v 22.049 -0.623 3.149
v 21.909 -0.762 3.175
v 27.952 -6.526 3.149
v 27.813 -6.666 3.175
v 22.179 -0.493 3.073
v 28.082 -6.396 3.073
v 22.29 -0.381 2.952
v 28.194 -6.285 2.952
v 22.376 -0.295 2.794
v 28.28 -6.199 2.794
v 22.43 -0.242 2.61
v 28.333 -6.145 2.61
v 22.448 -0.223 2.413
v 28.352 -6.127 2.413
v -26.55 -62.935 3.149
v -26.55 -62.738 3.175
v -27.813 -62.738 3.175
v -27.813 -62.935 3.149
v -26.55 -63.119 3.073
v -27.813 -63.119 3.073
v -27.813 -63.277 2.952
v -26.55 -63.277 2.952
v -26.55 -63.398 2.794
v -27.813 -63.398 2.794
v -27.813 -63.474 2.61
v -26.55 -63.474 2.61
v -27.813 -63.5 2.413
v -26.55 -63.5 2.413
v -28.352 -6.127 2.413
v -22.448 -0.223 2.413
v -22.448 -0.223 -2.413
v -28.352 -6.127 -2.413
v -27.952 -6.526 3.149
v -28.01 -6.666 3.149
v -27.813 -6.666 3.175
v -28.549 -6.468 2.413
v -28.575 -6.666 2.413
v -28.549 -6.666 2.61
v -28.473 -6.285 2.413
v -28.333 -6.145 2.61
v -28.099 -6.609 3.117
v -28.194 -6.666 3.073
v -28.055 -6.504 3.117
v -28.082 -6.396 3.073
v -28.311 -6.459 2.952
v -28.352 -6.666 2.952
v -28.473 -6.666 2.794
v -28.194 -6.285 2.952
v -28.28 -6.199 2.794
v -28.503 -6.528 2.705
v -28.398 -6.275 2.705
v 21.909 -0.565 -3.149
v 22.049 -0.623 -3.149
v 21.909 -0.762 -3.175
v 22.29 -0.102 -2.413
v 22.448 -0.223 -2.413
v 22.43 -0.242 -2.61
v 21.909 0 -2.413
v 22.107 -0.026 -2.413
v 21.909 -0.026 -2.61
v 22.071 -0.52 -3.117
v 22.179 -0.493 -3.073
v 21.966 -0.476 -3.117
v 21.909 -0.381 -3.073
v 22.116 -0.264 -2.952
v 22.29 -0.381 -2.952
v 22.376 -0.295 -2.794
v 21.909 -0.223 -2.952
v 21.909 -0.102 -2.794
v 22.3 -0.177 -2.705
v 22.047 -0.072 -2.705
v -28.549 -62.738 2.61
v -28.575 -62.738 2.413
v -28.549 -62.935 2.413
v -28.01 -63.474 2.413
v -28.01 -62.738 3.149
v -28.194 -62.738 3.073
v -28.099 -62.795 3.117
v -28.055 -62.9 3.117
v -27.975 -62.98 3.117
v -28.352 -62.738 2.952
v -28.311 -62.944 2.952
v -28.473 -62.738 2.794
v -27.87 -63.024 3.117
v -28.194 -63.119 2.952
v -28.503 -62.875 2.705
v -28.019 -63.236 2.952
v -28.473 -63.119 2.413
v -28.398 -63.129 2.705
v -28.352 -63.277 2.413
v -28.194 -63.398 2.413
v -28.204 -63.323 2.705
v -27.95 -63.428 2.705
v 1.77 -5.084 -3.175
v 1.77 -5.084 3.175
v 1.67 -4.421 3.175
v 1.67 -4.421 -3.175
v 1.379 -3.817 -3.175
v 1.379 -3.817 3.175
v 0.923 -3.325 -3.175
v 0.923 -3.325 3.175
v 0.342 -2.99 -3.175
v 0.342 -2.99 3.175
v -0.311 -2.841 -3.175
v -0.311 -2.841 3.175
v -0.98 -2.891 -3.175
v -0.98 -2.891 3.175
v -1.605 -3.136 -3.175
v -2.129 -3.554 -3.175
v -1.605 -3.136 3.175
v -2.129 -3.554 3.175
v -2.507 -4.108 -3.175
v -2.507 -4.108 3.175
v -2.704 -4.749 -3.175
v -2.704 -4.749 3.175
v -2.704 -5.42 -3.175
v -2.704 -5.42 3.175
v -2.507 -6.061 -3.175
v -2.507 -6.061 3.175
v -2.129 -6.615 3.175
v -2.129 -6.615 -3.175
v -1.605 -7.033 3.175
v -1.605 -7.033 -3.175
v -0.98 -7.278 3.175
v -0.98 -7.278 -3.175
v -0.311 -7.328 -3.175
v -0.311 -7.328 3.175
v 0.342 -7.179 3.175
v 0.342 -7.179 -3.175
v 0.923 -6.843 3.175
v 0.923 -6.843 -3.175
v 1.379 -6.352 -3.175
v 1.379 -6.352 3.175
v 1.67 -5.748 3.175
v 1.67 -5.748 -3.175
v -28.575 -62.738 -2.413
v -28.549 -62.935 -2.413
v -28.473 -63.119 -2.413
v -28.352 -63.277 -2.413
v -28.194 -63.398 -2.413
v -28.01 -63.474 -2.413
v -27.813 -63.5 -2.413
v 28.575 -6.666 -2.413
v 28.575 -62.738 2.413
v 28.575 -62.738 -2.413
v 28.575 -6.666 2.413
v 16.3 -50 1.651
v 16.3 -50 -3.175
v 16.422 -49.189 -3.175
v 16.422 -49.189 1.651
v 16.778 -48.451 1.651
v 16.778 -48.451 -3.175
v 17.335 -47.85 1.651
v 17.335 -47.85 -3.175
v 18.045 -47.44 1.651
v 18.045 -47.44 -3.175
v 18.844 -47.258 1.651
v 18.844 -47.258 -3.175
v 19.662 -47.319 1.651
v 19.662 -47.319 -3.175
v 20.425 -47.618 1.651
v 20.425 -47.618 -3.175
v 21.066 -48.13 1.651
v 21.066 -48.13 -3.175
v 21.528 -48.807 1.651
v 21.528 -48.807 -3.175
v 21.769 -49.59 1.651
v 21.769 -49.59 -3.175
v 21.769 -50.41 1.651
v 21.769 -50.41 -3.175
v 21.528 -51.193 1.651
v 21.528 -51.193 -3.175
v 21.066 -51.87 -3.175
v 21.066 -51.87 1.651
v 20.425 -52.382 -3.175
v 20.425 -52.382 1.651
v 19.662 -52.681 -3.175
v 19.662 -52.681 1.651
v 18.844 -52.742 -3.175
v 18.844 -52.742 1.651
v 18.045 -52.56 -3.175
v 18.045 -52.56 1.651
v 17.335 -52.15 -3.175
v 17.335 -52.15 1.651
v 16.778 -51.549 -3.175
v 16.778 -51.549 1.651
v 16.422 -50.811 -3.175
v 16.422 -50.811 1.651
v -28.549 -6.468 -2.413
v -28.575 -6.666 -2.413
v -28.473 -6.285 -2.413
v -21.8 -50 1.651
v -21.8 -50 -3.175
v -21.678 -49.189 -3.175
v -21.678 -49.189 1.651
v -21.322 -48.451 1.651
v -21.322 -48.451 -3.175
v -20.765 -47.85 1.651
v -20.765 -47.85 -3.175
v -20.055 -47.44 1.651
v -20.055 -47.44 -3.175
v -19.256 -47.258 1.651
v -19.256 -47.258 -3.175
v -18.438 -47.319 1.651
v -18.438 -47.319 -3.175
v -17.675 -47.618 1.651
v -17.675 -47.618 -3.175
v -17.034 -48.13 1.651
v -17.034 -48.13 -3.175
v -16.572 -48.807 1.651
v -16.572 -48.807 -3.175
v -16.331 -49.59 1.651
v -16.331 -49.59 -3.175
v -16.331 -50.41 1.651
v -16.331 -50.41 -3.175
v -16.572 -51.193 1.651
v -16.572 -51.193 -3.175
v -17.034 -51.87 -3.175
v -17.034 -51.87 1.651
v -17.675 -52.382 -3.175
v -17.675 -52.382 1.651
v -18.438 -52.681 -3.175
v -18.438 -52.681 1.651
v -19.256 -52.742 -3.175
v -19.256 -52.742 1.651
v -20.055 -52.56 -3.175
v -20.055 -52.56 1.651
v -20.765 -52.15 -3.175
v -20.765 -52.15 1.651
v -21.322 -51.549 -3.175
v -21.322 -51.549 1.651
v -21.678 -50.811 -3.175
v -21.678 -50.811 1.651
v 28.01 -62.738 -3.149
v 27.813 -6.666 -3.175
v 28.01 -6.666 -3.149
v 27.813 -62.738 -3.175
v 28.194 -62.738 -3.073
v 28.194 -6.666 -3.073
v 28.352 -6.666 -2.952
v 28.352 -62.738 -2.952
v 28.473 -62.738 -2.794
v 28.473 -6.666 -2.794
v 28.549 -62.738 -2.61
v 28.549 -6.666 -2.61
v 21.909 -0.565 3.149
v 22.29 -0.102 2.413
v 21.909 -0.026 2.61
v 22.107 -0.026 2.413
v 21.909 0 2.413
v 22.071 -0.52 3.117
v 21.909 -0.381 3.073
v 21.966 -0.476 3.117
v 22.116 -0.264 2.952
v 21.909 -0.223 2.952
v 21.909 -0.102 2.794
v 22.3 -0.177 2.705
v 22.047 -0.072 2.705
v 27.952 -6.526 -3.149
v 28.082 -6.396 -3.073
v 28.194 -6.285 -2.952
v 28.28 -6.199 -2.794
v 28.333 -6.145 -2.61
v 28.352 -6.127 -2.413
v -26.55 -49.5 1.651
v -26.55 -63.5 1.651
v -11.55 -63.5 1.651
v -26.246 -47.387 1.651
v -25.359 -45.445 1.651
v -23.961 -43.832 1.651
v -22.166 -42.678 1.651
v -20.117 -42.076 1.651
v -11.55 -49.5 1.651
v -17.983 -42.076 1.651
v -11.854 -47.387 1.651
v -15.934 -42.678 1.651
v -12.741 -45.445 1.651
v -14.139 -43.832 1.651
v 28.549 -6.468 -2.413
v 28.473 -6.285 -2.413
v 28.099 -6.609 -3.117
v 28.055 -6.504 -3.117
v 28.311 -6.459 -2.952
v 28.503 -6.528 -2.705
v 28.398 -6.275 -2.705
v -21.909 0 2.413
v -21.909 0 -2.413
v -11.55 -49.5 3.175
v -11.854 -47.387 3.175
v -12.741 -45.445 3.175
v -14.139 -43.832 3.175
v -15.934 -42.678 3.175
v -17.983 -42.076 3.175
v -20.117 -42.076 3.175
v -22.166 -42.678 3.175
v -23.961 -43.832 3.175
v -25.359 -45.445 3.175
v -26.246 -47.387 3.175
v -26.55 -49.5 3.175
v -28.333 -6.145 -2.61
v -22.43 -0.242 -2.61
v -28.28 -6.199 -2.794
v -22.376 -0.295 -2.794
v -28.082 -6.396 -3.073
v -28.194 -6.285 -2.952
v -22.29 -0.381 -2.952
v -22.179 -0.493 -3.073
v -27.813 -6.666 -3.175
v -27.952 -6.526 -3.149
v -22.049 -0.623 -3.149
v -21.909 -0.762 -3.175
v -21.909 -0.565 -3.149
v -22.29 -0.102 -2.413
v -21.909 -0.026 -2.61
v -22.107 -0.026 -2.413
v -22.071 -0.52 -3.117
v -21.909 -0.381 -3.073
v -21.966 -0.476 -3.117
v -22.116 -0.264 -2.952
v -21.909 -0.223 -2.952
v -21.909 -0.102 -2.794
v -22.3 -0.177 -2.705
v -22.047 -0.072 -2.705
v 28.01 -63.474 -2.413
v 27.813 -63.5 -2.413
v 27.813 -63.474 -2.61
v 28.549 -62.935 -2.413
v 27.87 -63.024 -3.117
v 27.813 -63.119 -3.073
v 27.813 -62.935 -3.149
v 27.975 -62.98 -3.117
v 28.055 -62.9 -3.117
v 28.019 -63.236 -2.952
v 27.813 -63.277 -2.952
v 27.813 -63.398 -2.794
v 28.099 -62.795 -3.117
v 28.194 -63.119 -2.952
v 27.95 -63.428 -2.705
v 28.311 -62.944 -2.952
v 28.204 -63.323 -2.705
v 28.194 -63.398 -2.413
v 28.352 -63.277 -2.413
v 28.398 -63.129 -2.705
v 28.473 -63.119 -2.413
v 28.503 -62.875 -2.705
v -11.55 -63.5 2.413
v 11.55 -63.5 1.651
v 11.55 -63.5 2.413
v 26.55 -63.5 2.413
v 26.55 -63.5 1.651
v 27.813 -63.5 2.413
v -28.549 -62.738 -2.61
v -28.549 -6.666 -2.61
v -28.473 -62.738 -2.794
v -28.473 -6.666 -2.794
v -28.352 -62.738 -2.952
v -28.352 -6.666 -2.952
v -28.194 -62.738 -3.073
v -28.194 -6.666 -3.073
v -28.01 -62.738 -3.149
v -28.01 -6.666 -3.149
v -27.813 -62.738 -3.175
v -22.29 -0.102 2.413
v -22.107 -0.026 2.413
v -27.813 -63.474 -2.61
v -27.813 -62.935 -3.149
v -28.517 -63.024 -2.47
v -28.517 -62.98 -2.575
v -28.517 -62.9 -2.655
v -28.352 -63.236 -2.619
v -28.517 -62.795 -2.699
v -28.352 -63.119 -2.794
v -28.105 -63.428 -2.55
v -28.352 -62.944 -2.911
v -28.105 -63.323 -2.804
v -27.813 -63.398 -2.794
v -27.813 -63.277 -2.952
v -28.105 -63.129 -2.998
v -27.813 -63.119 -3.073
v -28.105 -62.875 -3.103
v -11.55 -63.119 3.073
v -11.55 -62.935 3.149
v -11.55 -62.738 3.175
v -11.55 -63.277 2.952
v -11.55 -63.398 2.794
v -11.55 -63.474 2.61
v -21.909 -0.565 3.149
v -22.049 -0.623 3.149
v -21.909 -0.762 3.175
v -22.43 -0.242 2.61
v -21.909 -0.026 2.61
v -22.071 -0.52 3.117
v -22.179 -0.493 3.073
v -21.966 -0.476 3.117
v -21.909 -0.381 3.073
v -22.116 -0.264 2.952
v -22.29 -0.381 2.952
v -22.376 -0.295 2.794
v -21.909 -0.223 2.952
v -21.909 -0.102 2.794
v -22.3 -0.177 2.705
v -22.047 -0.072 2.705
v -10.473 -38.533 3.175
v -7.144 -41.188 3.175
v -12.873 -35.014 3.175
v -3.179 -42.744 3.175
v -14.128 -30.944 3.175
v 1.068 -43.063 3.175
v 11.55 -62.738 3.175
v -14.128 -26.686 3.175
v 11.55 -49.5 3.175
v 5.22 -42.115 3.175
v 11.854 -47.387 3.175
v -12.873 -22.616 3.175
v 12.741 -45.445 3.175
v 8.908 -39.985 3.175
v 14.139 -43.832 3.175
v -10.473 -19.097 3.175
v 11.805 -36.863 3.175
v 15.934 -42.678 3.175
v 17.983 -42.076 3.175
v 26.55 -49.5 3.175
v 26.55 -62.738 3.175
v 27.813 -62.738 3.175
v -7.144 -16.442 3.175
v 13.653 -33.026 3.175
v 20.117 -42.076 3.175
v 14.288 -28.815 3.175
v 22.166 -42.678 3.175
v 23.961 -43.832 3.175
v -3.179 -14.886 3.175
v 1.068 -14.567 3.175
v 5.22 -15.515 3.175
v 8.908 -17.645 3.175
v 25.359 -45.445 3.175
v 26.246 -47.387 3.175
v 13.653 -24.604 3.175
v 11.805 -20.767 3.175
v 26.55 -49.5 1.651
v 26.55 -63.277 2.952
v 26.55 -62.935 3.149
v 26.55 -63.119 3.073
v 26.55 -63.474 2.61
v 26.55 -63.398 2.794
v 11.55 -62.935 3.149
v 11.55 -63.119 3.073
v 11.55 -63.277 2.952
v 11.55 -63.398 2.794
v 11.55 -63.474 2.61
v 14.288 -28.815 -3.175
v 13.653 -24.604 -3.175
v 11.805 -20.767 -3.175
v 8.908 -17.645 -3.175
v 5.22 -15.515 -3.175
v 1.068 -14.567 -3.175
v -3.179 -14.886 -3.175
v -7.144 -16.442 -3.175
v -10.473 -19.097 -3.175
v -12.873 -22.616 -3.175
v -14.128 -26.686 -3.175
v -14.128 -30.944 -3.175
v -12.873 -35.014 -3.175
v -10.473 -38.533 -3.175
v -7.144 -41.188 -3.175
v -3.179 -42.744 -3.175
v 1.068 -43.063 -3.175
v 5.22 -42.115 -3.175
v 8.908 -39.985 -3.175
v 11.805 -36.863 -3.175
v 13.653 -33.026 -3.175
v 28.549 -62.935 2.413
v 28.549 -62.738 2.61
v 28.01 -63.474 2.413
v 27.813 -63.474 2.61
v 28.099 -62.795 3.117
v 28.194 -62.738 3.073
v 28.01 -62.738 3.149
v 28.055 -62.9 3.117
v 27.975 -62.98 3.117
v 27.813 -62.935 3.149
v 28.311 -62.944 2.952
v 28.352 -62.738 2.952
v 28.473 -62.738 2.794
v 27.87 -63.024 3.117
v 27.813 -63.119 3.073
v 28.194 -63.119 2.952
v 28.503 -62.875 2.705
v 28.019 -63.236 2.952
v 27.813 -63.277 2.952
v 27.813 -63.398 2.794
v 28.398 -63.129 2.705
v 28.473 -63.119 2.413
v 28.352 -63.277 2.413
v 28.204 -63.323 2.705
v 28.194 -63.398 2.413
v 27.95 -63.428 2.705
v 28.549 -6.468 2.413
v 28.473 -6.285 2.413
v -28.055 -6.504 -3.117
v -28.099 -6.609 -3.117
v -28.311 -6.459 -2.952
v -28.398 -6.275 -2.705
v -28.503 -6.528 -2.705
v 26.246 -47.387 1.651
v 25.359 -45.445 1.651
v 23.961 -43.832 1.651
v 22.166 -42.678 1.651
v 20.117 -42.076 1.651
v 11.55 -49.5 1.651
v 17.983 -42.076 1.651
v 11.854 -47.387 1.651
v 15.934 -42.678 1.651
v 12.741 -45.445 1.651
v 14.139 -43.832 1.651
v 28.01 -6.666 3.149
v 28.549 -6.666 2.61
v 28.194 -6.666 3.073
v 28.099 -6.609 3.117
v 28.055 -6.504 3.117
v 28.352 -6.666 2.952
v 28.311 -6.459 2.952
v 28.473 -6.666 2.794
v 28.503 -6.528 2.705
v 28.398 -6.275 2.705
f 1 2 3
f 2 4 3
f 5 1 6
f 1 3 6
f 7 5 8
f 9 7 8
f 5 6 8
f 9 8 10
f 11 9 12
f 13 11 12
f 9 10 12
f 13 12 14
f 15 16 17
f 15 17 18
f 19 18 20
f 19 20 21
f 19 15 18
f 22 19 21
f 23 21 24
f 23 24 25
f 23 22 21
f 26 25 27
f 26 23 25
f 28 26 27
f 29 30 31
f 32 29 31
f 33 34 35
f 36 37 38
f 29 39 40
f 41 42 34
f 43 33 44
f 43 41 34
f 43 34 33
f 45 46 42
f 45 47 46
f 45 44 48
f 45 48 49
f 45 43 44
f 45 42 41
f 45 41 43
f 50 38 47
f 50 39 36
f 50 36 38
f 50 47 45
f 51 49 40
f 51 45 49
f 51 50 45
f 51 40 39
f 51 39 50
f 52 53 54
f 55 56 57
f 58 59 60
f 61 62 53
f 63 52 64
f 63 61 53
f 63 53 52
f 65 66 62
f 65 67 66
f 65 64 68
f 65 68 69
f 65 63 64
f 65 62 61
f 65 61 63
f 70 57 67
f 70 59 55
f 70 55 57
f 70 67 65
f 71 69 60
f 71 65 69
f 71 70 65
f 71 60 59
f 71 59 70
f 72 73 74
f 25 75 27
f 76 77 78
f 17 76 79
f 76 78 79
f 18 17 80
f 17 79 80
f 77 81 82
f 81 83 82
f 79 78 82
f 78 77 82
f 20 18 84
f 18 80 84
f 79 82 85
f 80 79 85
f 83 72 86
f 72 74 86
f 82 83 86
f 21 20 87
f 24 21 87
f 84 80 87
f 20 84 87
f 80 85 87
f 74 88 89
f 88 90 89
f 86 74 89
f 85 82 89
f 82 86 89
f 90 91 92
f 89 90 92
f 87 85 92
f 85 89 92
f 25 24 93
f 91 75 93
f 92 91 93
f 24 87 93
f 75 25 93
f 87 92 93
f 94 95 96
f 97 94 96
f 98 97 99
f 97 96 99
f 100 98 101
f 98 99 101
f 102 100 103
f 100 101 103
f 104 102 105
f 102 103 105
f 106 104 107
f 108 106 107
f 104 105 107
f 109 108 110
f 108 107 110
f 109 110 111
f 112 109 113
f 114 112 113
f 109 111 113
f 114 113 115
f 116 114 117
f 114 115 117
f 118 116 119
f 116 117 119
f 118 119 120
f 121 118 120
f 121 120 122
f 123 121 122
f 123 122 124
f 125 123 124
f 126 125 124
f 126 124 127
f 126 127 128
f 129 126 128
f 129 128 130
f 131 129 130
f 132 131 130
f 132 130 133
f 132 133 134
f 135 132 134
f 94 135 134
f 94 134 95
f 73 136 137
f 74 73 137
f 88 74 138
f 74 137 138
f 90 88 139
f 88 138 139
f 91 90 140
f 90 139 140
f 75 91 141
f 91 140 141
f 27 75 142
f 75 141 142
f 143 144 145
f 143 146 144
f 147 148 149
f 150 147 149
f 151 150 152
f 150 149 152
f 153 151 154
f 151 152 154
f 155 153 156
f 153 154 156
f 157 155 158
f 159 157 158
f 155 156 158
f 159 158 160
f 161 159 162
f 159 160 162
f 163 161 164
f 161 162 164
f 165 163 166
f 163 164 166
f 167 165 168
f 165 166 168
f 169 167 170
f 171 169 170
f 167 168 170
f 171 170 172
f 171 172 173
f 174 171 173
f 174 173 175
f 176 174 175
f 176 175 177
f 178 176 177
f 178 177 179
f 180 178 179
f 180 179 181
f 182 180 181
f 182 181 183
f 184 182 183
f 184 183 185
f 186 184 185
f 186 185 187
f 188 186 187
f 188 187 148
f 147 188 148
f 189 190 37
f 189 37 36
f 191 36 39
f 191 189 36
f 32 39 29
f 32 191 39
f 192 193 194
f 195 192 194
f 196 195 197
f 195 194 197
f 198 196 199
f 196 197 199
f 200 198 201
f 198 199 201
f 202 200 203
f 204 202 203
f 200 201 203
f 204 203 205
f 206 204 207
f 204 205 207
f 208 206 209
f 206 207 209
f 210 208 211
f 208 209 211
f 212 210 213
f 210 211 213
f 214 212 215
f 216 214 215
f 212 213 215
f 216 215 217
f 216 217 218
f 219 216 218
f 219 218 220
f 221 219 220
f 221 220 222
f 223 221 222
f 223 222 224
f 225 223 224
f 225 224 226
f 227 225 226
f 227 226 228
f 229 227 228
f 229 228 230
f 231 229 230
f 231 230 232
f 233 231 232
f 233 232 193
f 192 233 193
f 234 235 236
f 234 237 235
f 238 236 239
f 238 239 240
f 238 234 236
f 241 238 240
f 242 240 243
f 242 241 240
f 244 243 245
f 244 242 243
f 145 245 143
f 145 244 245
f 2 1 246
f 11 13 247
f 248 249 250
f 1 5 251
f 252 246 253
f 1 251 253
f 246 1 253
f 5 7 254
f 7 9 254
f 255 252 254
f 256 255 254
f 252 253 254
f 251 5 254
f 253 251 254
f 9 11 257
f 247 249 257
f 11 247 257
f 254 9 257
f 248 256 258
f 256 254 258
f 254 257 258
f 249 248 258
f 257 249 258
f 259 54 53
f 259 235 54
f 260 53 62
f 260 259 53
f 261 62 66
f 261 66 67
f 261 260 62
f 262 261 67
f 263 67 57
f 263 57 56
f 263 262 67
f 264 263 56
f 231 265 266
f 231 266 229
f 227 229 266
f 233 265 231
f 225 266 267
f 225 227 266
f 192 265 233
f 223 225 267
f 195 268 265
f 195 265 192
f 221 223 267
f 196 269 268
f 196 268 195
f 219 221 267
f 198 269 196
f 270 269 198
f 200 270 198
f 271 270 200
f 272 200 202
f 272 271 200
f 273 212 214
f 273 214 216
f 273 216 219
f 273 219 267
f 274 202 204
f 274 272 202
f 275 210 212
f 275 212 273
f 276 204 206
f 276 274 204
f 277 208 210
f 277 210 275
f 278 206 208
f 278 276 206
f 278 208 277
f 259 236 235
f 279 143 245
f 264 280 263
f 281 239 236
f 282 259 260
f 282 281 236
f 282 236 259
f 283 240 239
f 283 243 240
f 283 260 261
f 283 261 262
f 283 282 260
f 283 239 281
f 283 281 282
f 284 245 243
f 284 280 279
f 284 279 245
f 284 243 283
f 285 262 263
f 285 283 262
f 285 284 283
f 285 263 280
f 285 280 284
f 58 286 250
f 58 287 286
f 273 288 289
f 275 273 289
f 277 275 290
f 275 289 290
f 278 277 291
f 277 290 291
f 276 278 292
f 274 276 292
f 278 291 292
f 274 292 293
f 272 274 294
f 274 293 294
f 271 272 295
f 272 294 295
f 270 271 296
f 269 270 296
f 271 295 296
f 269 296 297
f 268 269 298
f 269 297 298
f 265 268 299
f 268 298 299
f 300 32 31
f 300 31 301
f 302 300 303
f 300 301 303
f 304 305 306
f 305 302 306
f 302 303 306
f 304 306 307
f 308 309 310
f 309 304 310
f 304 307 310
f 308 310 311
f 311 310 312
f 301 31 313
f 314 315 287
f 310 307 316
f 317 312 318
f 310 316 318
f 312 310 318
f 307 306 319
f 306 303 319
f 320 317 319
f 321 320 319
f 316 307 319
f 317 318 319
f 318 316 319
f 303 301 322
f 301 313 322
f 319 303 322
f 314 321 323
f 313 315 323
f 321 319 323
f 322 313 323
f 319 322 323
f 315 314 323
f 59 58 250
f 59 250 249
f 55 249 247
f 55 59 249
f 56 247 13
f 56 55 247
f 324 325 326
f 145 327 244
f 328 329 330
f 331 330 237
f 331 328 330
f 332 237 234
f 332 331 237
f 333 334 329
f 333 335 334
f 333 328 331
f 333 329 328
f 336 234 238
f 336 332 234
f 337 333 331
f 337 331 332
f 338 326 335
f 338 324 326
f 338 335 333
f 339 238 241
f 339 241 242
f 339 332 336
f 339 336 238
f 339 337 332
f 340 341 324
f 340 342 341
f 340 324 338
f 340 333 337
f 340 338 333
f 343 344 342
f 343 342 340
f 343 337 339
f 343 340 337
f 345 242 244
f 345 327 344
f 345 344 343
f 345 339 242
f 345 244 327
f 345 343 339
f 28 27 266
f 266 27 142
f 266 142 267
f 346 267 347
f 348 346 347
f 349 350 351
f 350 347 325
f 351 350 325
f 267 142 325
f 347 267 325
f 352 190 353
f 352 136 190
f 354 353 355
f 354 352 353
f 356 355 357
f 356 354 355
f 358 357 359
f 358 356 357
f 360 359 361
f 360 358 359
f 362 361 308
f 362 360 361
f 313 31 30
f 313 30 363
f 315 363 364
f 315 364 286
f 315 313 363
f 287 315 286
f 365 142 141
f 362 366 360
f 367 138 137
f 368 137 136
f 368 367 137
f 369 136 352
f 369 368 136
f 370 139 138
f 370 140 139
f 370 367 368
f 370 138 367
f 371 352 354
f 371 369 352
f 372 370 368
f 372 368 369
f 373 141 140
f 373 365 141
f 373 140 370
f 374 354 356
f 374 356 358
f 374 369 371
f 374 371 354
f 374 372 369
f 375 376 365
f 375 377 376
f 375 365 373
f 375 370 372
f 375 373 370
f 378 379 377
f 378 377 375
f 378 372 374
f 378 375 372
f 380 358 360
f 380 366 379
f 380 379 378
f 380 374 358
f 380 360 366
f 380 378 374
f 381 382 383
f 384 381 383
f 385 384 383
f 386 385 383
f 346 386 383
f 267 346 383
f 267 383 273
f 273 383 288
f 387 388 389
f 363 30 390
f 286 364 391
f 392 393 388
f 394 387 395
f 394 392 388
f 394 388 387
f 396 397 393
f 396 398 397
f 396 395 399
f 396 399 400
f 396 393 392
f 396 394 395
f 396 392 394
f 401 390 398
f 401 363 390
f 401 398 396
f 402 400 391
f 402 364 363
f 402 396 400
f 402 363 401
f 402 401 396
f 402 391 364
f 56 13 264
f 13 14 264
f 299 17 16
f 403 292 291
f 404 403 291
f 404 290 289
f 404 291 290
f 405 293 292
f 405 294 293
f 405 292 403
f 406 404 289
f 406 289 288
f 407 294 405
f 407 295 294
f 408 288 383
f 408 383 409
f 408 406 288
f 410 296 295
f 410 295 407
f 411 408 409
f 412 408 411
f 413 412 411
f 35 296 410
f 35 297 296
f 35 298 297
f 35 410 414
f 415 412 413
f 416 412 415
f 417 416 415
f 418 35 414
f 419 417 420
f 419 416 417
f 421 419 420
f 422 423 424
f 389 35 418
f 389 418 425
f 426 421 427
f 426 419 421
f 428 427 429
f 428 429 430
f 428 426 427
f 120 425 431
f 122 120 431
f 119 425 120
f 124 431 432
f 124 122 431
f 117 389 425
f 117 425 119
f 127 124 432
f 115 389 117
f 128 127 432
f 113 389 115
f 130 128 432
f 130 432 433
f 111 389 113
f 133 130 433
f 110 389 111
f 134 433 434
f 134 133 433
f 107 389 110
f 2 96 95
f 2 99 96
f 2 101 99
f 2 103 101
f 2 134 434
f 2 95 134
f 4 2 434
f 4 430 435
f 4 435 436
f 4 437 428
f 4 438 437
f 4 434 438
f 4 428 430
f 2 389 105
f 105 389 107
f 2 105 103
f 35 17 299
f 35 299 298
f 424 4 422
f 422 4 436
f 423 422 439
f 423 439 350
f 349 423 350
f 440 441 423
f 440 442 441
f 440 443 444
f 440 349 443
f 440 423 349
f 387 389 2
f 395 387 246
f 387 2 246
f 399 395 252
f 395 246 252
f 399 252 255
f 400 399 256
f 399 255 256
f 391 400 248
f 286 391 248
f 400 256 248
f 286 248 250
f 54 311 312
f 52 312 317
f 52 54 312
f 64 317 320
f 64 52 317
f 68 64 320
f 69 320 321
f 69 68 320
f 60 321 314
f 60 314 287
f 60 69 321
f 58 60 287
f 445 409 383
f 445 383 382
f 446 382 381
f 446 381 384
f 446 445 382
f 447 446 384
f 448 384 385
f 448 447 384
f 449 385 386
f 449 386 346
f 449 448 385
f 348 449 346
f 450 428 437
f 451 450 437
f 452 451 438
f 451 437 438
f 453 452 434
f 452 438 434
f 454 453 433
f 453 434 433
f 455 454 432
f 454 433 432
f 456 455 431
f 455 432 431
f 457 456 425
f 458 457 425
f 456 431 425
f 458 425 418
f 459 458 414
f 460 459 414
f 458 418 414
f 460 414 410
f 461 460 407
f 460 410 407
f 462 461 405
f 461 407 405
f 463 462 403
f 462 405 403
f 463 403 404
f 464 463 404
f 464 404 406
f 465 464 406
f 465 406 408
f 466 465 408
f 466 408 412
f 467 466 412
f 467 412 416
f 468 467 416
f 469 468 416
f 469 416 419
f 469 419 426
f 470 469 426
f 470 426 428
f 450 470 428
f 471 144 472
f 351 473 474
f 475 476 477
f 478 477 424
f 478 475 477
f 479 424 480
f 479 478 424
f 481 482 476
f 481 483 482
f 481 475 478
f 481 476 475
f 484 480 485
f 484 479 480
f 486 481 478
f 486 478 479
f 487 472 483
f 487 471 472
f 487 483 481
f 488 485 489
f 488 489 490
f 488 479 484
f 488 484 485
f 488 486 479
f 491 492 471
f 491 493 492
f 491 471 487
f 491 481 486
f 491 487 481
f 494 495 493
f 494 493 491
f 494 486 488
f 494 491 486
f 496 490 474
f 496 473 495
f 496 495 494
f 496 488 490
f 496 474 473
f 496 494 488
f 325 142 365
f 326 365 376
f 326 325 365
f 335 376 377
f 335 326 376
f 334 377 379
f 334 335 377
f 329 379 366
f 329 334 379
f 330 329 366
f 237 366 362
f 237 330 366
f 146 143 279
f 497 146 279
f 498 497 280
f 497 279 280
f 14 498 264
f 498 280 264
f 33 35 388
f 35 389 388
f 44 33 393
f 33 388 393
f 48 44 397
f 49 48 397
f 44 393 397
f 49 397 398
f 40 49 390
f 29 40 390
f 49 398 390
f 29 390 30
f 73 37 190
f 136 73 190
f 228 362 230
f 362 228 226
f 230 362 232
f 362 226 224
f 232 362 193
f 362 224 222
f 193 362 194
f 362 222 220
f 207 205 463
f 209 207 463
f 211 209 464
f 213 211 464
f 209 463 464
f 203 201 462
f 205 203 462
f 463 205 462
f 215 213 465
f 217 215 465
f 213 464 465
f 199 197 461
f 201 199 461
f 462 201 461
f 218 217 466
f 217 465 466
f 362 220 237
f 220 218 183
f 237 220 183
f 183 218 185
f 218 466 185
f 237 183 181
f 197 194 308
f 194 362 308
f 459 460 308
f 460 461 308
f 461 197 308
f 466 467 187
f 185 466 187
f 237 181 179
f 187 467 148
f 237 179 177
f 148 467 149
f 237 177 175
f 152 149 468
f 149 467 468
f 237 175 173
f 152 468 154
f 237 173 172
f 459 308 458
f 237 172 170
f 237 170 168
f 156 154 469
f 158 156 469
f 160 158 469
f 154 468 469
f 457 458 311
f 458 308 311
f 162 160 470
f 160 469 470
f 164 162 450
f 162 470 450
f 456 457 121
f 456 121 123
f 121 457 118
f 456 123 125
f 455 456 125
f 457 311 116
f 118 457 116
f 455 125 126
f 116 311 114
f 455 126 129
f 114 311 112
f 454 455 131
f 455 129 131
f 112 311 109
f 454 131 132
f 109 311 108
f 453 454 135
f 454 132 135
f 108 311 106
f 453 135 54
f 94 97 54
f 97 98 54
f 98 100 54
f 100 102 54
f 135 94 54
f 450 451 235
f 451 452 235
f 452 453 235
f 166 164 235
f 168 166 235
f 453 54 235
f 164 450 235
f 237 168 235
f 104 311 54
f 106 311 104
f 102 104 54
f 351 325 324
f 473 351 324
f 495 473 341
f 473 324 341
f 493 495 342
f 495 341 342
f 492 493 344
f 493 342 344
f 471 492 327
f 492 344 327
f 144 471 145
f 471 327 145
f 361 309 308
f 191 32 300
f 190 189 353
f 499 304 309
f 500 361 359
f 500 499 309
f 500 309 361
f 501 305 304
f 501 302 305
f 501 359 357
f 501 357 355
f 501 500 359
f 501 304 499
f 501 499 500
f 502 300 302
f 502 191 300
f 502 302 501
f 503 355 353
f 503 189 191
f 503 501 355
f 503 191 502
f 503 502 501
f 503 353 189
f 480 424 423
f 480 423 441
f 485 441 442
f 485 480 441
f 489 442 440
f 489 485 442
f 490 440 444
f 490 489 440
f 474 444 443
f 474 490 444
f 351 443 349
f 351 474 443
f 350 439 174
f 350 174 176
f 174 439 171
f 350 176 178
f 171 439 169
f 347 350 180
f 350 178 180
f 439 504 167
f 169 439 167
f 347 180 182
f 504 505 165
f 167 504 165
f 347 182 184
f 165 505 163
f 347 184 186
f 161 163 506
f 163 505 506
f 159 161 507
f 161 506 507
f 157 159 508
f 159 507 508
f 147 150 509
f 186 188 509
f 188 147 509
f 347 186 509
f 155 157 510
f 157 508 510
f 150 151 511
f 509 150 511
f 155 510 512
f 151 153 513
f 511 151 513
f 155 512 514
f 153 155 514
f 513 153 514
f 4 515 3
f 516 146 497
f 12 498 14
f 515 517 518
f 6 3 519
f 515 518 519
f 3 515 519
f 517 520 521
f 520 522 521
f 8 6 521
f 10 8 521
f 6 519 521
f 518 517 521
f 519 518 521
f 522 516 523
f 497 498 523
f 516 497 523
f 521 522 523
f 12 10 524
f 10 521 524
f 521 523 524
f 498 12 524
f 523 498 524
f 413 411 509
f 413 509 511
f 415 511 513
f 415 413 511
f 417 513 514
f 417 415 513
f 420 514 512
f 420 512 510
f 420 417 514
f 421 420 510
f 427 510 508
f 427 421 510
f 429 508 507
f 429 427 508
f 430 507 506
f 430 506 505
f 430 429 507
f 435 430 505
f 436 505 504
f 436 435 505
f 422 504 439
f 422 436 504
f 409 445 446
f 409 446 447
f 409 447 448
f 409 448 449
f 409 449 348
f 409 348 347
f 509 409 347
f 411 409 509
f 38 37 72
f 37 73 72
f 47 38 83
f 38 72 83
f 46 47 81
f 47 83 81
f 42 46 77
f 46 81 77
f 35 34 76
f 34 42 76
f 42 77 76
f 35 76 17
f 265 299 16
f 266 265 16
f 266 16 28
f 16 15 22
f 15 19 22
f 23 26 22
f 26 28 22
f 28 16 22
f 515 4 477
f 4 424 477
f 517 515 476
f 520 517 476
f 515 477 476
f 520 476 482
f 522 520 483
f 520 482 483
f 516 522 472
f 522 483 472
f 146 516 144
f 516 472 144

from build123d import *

# Parameters (mm, degrees)
SKETCH2_W            = 57.15
SKETCH2_H            = 6.35
BOSS_EXTRUDE1_DEPTH  = 63.5
SKETCH3_R            = 14.2875
CUT_EXTRUDE1_DEPTH   = 70.922121857
CHAMFER1_SIZE        = 6.35
M4_CLEARANCE_HOLE1_D = 4.5
M5_CLEARANCE_HOLE1_D = 5.5
FILLET1_R            = 0.762
CUT_EXTRUDE4_DEPTH   = 1.524


with BuildPart() as part:
    # Sketch2 → Boss-Extrude1 (new body)
    with BuildSketch(Plane(origin=(0, 0, 0), x_dir=(1, 0, 0), z_dir=(0, 1, 0))):
        Rectangle(SKETCH2_W, SKETCH2_H)
    extrude(amount=-BOSS_EXTRUDE1_DEPTH)

    # Sketch3 → Cut-Extrude1 (cut, through all)
    with BuildSketch(Plane.XY.offset(3.175)):
        with Locations((0, -28.8150046)):
            Circle(SKETCH3_R)
    extrude(amount=-CUT_EXTRUDE1_DEPTH, mode=Mode.SUBTRACT)

    # Chamfer1
    chamfer1_edges = [part.edges().sort_by_distance(p)[0] for p in [
        (28.575, 0, 0),
        (-28.575, 0, 0),
    ]]
    chamfer(chamfer1_edges, length=CHAMFER1_SIZE)

    # M4 Clearance Hole1 (through all)
    with Locations(Plane(origin=(0, 0, -3.175), x_dir=(-1, 0, 0), z_dir=(0, 0, -1))):
        with Locations((0.479594109, -5.08436305)):
            Hole(M4_CLEARANCE_HOLE1_D / 2)

    # M5 Clearance Hole1 (through all)
    with Locations(Plane.XY.offset(3.175)):
        with Locations((-19.05, -50.000003124), (19.05, -50.000003124)):
            Hole(M5_CLEARANCE_HOLE1_D / 2)

    # Fillet1
    fillet1_edges = [part.edges().sort_by_distance(p)[0] for p in [
        (28.575, -63.5, 0),
        (0, -63.5, -3.175),
        (0, 0, 3.175),
        (0, 0, -3.175),
        (22.225, 0, 0),
        (-22.225, 0, 0),
        (25.4, -3.175, 3.175),
        (-25.4, -3.175, 3.175),
        (-28.575, -6.35, 0),
        (25.4, -3.175, -3.175),
        (-25.4, -3.175, -3.175),
        (28.575, -6.35, 0),
        (-28.575, -63.5, 0),
        (-28.575, -34.925, -3.175),
        (28.575, -34.925, -3.175),
        (28.575, -34.925, 3.175),
        (-28.575, -34.925, 3.175),
        (0, -63.5, 3.175),
    ]]
    fillet(fillet1_edges, radius=FILLET1_R)

    # Sketch8 → Cut-Extrude4 (cut)
    with BuildSketch(Plane.XY.offset(3.175)):
        with BuildLine():
            Line((11.55, -63.5), (11.55, -49.5))
            ThreePointArc((11.55, -49.5), (19.05, -42), (26.55, -49.5))
            Line((26.55, -49.5), (26.55, -63.5))
            Line((26.55, -63.5), (11.55, -63.5))
        make_face()
    cut_extrude4 = extrude(amount=-CUT_EXTRUDE4_DEPTH, mode=Mode.SUBTRACT)

    # Mirror1: Cut-Extrude4 across plane
    add(cut_extrude4.mirror(Plane(origin=(0, 0, 0), x_dir=(0, 0, 1), z_dir=(1, 0, 0))), mode=Mode.SUBTRACT)


solid = part.part
